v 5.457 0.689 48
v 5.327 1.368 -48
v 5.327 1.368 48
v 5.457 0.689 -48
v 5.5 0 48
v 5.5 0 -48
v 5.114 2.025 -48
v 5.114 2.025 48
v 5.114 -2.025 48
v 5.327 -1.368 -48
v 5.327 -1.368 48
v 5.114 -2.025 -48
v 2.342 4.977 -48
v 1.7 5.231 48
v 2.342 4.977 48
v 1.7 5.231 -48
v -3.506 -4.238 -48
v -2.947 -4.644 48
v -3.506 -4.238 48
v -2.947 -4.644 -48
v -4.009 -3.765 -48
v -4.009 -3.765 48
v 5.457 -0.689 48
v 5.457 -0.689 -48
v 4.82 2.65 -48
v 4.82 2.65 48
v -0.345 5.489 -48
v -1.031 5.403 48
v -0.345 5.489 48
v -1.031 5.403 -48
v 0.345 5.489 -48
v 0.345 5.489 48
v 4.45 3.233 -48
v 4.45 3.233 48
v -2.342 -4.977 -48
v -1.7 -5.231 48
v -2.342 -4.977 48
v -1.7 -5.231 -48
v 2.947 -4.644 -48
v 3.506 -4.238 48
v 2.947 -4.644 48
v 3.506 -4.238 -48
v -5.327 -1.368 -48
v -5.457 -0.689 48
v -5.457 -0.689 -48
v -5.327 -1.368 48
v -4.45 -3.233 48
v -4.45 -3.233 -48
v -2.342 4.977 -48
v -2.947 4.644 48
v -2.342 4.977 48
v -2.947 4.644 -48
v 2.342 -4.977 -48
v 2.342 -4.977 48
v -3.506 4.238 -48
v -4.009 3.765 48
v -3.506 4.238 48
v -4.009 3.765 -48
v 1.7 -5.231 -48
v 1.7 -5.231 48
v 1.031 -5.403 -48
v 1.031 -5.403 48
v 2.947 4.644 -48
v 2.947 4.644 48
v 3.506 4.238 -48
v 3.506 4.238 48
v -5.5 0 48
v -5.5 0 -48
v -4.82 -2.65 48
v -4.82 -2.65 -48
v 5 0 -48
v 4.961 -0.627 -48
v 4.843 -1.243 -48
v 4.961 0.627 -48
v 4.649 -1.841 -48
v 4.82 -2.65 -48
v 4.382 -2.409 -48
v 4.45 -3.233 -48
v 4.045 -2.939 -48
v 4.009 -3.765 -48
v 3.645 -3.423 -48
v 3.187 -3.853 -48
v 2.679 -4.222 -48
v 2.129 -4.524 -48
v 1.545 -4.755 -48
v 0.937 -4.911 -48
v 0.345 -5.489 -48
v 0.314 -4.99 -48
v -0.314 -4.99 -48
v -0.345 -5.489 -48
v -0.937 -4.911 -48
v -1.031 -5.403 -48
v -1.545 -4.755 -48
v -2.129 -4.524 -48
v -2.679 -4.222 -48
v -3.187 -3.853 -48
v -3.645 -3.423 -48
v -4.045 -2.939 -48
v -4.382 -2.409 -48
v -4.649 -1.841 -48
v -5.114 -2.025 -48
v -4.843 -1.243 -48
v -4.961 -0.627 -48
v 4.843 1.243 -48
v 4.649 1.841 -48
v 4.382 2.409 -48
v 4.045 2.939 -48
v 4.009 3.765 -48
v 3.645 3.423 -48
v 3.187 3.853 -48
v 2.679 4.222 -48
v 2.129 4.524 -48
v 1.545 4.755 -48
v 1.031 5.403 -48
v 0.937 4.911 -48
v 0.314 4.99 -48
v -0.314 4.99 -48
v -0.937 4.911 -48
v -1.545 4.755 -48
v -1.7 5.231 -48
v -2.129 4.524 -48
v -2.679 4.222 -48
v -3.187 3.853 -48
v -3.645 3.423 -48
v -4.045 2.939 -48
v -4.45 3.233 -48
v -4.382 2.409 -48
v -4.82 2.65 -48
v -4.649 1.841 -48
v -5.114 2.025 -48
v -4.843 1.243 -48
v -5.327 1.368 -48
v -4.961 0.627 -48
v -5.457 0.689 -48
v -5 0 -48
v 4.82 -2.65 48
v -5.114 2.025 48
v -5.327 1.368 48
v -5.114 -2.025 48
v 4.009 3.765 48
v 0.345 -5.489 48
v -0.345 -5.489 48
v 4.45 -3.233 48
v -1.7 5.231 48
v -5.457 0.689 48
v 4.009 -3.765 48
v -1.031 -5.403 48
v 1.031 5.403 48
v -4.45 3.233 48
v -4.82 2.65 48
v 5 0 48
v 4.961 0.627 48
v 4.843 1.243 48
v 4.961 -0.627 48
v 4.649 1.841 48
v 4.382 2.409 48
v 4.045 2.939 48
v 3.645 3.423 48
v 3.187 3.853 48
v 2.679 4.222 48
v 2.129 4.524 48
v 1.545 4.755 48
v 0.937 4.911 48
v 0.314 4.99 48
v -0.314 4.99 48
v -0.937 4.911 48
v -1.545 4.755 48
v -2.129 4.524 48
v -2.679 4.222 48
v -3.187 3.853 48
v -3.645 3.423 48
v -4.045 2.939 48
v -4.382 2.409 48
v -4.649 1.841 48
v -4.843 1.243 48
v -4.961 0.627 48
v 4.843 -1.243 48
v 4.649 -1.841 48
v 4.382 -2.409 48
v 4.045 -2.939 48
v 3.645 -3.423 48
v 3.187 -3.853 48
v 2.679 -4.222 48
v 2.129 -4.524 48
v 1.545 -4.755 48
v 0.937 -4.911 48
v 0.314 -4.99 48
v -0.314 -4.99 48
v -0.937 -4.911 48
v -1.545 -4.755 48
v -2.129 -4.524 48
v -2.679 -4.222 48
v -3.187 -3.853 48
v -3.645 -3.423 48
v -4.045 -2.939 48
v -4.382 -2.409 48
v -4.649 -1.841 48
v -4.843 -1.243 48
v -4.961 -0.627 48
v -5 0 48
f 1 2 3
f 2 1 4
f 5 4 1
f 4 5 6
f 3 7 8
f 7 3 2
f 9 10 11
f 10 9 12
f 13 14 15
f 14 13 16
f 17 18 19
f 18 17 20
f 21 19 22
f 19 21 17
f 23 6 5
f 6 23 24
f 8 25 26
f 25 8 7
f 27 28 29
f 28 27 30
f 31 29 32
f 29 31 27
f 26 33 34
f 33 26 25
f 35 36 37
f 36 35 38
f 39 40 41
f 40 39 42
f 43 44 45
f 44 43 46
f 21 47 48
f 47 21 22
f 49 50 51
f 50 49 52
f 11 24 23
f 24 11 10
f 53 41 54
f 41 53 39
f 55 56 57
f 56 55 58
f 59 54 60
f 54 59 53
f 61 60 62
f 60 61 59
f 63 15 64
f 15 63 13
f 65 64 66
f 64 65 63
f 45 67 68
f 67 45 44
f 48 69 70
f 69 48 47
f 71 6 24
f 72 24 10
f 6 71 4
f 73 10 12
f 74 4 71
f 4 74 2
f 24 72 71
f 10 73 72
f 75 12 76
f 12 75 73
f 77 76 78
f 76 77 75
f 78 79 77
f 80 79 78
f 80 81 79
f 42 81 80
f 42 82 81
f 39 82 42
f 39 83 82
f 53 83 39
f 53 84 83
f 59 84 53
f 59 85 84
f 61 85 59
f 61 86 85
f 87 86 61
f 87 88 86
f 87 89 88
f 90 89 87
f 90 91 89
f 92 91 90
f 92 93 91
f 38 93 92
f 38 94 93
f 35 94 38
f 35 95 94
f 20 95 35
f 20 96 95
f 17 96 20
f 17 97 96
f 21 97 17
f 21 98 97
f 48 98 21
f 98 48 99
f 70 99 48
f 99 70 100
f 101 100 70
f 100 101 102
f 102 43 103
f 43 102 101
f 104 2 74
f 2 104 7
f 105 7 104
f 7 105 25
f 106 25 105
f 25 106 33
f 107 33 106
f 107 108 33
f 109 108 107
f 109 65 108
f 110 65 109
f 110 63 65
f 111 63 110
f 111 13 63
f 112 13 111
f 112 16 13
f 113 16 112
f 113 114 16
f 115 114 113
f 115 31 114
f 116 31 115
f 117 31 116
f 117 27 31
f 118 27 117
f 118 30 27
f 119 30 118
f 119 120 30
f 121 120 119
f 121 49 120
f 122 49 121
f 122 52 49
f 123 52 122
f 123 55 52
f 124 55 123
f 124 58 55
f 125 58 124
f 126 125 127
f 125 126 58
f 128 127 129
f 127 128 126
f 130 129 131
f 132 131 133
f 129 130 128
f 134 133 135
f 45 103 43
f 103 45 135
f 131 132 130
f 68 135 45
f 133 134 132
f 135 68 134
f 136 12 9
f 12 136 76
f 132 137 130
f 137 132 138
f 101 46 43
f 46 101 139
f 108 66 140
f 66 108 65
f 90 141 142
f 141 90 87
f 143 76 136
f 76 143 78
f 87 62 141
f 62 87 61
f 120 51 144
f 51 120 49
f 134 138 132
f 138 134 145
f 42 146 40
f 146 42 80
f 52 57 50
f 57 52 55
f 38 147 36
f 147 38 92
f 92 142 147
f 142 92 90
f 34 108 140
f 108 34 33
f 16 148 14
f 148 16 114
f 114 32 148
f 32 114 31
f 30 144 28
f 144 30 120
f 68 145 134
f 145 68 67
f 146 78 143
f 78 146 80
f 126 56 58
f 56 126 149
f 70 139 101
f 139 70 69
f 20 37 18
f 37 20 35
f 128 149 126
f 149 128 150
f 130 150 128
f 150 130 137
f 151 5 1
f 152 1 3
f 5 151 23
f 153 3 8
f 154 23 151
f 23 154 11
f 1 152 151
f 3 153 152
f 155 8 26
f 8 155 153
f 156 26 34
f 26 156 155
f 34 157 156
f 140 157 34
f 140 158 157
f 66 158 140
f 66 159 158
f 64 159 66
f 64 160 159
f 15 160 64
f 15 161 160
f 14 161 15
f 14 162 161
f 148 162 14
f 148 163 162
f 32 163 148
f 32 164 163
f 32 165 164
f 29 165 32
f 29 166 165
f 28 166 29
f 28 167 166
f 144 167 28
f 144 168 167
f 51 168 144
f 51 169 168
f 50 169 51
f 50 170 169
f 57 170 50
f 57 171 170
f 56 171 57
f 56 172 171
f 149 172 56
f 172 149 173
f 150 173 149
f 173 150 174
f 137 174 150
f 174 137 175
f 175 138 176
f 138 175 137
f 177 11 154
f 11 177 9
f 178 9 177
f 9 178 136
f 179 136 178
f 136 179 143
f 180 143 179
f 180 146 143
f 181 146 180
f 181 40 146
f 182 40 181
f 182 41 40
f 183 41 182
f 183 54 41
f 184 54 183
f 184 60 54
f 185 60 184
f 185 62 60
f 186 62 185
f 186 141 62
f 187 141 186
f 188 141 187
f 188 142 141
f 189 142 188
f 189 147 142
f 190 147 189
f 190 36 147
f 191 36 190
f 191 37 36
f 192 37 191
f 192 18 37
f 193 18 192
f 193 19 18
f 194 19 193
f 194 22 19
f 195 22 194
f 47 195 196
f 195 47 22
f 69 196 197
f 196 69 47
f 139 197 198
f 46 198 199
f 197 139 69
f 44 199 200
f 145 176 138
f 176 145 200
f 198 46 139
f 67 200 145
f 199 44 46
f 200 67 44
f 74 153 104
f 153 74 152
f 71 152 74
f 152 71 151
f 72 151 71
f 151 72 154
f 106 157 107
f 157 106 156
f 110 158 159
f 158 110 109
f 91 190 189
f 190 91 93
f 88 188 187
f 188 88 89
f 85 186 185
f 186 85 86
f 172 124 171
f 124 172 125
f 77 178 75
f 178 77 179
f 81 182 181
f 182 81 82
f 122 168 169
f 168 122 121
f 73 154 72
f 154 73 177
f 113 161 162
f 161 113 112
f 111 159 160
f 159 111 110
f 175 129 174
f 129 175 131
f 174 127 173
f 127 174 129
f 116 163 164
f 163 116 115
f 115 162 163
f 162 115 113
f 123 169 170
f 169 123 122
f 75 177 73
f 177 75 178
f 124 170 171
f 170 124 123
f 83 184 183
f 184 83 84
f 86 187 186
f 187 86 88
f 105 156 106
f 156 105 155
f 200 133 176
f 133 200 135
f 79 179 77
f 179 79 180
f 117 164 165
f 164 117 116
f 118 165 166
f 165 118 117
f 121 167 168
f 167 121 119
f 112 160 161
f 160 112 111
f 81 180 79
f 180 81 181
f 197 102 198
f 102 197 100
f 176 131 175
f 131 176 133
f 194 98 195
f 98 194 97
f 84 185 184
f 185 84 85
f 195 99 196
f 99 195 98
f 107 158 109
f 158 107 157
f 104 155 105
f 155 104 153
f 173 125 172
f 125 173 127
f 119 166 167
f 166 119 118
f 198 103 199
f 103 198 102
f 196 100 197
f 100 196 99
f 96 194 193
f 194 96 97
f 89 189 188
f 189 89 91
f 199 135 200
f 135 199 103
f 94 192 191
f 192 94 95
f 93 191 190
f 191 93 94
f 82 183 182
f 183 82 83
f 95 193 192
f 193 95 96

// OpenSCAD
$fn = 50;


difference() {
	union() {
		translate(v = [0, 0, -48.0000000000]) {
			cylinder(h = 96, r = 5.5000000000);
		}
	}
	union() {
		translate(v = [0, 0, -100.0000000000]) {
			cylinder(h = 200, r = 5.0000000000);
		}
	}
}
